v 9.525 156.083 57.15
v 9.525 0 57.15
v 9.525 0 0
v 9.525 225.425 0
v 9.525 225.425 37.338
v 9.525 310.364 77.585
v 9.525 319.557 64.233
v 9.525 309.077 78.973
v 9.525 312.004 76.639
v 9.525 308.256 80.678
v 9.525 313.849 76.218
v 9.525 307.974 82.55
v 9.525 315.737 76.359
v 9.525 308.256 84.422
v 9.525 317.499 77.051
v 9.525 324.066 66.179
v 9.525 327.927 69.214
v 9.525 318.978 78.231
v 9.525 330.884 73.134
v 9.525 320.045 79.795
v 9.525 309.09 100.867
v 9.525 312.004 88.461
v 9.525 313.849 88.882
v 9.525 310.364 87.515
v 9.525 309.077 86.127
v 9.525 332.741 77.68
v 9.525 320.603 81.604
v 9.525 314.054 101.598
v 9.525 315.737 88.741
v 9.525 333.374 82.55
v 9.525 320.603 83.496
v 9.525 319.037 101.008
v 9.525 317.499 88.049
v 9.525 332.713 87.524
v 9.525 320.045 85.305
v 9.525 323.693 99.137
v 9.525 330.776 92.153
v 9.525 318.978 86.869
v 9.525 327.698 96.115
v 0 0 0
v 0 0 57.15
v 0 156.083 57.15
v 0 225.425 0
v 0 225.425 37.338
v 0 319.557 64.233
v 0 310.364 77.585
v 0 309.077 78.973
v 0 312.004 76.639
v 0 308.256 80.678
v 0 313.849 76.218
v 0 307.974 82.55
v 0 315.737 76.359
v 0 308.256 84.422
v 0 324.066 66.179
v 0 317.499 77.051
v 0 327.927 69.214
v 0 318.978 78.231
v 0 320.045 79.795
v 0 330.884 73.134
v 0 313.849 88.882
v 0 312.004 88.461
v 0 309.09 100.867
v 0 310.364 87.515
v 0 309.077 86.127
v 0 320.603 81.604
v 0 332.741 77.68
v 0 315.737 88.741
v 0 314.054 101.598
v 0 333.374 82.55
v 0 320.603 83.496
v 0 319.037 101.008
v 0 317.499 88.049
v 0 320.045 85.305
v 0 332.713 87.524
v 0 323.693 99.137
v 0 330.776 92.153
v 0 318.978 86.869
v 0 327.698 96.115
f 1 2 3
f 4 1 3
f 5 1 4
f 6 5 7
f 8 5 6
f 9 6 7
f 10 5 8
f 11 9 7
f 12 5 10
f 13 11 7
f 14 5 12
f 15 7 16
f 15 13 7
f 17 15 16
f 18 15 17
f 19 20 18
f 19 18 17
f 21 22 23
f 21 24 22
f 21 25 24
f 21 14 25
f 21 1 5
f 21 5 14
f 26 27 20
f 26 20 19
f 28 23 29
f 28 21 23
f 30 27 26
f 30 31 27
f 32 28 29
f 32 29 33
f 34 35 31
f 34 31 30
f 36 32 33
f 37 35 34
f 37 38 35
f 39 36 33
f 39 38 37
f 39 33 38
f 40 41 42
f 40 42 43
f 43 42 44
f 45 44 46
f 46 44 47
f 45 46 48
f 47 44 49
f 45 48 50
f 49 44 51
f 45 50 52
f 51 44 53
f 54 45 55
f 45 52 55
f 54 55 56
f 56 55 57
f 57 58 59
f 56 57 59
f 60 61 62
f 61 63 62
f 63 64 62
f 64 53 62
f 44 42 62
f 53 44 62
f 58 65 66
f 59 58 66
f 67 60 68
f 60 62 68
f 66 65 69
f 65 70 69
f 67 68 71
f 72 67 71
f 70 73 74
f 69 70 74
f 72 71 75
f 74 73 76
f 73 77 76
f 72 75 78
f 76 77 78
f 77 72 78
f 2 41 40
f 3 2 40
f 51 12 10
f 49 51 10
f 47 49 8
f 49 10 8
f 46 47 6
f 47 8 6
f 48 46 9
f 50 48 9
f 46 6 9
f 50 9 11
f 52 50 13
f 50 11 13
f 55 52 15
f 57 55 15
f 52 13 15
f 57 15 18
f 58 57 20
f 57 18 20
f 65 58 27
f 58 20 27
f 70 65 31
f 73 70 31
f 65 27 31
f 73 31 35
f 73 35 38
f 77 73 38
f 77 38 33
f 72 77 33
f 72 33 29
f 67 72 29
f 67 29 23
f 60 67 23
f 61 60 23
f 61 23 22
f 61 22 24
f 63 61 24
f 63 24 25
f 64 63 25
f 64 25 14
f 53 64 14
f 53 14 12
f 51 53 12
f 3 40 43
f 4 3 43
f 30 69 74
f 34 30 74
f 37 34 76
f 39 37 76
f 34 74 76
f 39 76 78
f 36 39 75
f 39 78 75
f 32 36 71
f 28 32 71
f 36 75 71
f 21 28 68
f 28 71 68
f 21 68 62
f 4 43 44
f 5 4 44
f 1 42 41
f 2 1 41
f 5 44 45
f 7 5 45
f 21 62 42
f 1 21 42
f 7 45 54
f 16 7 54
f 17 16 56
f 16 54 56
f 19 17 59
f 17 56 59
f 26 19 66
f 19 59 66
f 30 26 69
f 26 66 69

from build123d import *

# Parameters (mm, degrees)
F1_DEPTH = 9.525
F2_DEPTH = 9.525
F3_D     = 12.7


with BuildPart() as f1:
    # F0 (on Right) → F1 (new body)
    with BuildSketch(Plane.YZ):
        Polygon((0, 57.15), (0, 0), (225.425, 0), (225.425, 37.3376765309), (225.425, 57.15), (156.083, 57.15), align=None)
    extrude(amount=F1_DEPTH)

    # F0 (on Right) → F2 (join)
    with BuildSketch(Plane.YZ):
        Polygon((0, 57.15), (0, 0), (225.425, 0), (225.425, 37.3376765309), (225.425, 57.15), (156.083, 57.15), align=None)
        with BuildLine():
            Line((225.425, 57.15), (225.425, 37.3376765309))
            Line((225.425, 37.3376765309), (319.5570650431, 64.2329913682))
            ThreePointArc((319.5570650431, 64.2329913682), (305.0721225399, 65.8972639905), (296.0065399278, 77.3164835165))
            Line((296.0065399278, 77.3164835165), (225.425, 57.15))
        make_face()
        with BuildLine():
            Line((309.0900320761, 100.8670086318), (156.083, 57.15))
            Line((156.083, 57.15), (225.425, 57.15))
            Line((225.425, 57.15), (296.0065399278, 77.3164835165))
            ThreePointArc((296.0065399278, 77.3164835165), (297.67081255, 91.8014260196), (309.0900320761, 100.8670086318))
        make_face()
        with BuildLine():
            Line((314.3235485596, 82.55), (319.5570650431, 64.2329913682))
            ThreePointArc((319.5570650431, 64.2329913682), (329.5321150438, 71.0782082701), (333.3735485596, 82.55))
            ThreePointArc((333.3735485596, 82.55), (325.7953402895, 97.7585664842), (309.0900320761, 100.8670086318))
            Line((309.0900320761, 100.8670086318), (314.3235485596, 82.55))
        make_face()
        with BuildLine():
            ThreePointArc((296.0065399278, 77.3164835165), (305.0721225399, 65.8972639905), (319.5570650431, 64.2329913682))
            Line((319.5570650431, 64.2329913682), (314.3235485596, 82.55))
            Line((314.3235485596, 82.55), (296.0065399278, 77.3164835165))
        make_face()
        with BuildLine():
            Line((314.3235485596, 82.55), (309.0900320761, 100.8670086318))
            ThreePointArc((309.0900320761, 100.8670086318), (297.67081255, 91.8014260196), (296.0065399278, 77.3164835165))
            Line((296.0065399278, 77.3164835165), (314.3235485596, 82.55))
        make_face()
    extrude(amount=F2_DEPTH)

    # F3 (through all)
    with Locations(Plane(origin=(0, 0, 0), x_dir=(0, 1, 0), z_dir=(-1, 0, 0))):
        with Locations((314.3235485596, -82.55)):
            Hole(F3_D / 2)


solid = f1.part
